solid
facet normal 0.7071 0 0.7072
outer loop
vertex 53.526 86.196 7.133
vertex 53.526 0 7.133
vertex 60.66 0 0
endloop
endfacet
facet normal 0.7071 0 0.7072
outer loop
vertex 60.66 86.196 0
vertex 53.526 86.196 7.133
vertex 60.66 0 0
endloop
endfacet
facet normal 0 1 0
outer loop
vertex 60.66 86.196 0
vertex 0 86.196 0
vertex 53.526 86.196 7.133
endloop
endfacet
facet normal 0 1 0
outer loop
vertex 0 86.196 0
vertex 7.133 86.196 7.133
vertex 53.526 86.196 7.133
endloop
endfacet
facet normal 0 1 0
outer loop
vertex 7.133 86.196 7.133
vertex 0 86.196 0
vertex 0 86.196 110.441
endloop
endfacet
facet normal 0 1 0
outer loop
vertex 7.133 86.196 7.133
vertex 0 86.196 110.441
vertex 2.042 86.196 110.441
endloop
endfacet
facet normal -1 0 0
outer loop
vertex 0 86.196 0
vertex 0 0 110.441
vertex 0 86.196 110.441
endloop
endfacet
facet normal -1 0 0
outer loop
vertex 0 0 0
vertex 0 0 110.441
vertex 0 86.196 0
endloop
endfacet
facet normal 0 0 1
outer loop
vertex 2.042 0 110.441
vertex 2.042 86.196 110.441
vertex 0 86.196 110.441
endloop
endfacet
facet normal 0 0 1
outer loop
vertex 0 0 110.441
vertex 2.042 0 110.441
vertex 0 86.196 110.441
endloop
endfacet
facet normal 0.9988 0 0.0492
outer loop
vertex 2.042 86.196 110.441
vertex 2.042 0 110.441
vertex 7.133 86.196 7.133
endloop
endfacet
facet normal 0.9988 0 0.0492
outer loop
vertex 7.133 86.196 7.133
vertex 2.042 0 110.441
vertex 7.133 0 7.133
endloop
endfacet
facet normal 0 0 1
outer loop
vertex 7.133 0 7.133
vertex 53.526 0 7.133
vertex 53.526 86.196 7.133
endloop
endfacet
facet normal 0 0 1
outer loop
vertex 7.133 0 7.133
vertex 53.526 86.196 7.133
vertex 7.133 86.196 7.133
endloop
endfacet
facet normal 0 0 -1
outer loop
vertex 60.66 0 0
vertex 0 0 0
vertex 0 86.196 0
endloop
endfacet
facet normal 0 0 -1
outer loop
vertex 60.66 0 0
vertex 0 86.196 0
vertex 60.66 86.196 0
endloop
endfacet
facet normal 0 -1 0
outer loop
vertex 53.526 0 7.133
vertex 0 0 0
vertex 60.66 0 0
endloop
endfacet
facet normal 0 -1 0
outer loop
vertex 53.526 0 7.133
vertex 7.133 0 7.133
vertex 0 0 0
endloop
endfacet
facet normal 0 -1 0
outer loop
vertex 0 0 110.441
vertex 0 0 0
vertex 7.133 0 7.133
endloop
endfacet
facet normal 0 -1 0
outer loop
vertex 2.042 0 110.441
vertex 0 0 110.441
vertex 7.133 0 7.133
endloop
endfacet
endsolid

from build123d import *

# Parameters (mm, degrees)
F1_DEPTH    = 86.19552
F3_DEPTH    = 86.19652
F4_T1_DEPTH = 131.920043526


# Not quite as in the source:
# - a fillet or chamfer that OpenCascade refuses, or shapes differently, is made with other operations: its cross-section is extruded or revolved along the edge and cut away or added


with BuildPart() as f1:
    # F0 (on Front) → F1 (new body)
    with BuildSketch(Plane.XZ):
        Polygon((7.1333632804, 110.441185534), (0, 110.441185534), (0, 0), (62.41620332, 0), (62.41620332, 7.1333632804), (7.1333632804, 7.1333632804), align=None)
    extrude(amount=-F1_DEPTH)

    # F2 (on face) → F3 (cut, through all)
    with BuildSketch(Plane.XZ):
        Polygon((7.1333632804, 110.441185534), (7.1333632804, 7.1333632804), (25.2087078989, 24.2729913443), (25.2087078989, 110.441185534), align=None)
        Polygon((2.0419980865, 110.441185534), (7.1333632804, 7.1333632804), (7.1333632804, 110.441185534), align=None)
    extrude(amount=-F3_DEPTH, mode=Mode.SUBTRACT)

    # F4: chamfer of 8.89 on 1 edges, made by hand

    # F4_s2 → F4_t1 (cut)
    with BuildSketch(Plane.XZ.offset(-109.057781763)):
        Polygon((53.52620332, 7.1333632804), (62.41620332, -1.7566367196), (62.41620332, 7.1333632804), align=None)
    extrude(amount=F4_T1_DEPTH, mode=Mode.SUBTRACT)


solid = f1.part
